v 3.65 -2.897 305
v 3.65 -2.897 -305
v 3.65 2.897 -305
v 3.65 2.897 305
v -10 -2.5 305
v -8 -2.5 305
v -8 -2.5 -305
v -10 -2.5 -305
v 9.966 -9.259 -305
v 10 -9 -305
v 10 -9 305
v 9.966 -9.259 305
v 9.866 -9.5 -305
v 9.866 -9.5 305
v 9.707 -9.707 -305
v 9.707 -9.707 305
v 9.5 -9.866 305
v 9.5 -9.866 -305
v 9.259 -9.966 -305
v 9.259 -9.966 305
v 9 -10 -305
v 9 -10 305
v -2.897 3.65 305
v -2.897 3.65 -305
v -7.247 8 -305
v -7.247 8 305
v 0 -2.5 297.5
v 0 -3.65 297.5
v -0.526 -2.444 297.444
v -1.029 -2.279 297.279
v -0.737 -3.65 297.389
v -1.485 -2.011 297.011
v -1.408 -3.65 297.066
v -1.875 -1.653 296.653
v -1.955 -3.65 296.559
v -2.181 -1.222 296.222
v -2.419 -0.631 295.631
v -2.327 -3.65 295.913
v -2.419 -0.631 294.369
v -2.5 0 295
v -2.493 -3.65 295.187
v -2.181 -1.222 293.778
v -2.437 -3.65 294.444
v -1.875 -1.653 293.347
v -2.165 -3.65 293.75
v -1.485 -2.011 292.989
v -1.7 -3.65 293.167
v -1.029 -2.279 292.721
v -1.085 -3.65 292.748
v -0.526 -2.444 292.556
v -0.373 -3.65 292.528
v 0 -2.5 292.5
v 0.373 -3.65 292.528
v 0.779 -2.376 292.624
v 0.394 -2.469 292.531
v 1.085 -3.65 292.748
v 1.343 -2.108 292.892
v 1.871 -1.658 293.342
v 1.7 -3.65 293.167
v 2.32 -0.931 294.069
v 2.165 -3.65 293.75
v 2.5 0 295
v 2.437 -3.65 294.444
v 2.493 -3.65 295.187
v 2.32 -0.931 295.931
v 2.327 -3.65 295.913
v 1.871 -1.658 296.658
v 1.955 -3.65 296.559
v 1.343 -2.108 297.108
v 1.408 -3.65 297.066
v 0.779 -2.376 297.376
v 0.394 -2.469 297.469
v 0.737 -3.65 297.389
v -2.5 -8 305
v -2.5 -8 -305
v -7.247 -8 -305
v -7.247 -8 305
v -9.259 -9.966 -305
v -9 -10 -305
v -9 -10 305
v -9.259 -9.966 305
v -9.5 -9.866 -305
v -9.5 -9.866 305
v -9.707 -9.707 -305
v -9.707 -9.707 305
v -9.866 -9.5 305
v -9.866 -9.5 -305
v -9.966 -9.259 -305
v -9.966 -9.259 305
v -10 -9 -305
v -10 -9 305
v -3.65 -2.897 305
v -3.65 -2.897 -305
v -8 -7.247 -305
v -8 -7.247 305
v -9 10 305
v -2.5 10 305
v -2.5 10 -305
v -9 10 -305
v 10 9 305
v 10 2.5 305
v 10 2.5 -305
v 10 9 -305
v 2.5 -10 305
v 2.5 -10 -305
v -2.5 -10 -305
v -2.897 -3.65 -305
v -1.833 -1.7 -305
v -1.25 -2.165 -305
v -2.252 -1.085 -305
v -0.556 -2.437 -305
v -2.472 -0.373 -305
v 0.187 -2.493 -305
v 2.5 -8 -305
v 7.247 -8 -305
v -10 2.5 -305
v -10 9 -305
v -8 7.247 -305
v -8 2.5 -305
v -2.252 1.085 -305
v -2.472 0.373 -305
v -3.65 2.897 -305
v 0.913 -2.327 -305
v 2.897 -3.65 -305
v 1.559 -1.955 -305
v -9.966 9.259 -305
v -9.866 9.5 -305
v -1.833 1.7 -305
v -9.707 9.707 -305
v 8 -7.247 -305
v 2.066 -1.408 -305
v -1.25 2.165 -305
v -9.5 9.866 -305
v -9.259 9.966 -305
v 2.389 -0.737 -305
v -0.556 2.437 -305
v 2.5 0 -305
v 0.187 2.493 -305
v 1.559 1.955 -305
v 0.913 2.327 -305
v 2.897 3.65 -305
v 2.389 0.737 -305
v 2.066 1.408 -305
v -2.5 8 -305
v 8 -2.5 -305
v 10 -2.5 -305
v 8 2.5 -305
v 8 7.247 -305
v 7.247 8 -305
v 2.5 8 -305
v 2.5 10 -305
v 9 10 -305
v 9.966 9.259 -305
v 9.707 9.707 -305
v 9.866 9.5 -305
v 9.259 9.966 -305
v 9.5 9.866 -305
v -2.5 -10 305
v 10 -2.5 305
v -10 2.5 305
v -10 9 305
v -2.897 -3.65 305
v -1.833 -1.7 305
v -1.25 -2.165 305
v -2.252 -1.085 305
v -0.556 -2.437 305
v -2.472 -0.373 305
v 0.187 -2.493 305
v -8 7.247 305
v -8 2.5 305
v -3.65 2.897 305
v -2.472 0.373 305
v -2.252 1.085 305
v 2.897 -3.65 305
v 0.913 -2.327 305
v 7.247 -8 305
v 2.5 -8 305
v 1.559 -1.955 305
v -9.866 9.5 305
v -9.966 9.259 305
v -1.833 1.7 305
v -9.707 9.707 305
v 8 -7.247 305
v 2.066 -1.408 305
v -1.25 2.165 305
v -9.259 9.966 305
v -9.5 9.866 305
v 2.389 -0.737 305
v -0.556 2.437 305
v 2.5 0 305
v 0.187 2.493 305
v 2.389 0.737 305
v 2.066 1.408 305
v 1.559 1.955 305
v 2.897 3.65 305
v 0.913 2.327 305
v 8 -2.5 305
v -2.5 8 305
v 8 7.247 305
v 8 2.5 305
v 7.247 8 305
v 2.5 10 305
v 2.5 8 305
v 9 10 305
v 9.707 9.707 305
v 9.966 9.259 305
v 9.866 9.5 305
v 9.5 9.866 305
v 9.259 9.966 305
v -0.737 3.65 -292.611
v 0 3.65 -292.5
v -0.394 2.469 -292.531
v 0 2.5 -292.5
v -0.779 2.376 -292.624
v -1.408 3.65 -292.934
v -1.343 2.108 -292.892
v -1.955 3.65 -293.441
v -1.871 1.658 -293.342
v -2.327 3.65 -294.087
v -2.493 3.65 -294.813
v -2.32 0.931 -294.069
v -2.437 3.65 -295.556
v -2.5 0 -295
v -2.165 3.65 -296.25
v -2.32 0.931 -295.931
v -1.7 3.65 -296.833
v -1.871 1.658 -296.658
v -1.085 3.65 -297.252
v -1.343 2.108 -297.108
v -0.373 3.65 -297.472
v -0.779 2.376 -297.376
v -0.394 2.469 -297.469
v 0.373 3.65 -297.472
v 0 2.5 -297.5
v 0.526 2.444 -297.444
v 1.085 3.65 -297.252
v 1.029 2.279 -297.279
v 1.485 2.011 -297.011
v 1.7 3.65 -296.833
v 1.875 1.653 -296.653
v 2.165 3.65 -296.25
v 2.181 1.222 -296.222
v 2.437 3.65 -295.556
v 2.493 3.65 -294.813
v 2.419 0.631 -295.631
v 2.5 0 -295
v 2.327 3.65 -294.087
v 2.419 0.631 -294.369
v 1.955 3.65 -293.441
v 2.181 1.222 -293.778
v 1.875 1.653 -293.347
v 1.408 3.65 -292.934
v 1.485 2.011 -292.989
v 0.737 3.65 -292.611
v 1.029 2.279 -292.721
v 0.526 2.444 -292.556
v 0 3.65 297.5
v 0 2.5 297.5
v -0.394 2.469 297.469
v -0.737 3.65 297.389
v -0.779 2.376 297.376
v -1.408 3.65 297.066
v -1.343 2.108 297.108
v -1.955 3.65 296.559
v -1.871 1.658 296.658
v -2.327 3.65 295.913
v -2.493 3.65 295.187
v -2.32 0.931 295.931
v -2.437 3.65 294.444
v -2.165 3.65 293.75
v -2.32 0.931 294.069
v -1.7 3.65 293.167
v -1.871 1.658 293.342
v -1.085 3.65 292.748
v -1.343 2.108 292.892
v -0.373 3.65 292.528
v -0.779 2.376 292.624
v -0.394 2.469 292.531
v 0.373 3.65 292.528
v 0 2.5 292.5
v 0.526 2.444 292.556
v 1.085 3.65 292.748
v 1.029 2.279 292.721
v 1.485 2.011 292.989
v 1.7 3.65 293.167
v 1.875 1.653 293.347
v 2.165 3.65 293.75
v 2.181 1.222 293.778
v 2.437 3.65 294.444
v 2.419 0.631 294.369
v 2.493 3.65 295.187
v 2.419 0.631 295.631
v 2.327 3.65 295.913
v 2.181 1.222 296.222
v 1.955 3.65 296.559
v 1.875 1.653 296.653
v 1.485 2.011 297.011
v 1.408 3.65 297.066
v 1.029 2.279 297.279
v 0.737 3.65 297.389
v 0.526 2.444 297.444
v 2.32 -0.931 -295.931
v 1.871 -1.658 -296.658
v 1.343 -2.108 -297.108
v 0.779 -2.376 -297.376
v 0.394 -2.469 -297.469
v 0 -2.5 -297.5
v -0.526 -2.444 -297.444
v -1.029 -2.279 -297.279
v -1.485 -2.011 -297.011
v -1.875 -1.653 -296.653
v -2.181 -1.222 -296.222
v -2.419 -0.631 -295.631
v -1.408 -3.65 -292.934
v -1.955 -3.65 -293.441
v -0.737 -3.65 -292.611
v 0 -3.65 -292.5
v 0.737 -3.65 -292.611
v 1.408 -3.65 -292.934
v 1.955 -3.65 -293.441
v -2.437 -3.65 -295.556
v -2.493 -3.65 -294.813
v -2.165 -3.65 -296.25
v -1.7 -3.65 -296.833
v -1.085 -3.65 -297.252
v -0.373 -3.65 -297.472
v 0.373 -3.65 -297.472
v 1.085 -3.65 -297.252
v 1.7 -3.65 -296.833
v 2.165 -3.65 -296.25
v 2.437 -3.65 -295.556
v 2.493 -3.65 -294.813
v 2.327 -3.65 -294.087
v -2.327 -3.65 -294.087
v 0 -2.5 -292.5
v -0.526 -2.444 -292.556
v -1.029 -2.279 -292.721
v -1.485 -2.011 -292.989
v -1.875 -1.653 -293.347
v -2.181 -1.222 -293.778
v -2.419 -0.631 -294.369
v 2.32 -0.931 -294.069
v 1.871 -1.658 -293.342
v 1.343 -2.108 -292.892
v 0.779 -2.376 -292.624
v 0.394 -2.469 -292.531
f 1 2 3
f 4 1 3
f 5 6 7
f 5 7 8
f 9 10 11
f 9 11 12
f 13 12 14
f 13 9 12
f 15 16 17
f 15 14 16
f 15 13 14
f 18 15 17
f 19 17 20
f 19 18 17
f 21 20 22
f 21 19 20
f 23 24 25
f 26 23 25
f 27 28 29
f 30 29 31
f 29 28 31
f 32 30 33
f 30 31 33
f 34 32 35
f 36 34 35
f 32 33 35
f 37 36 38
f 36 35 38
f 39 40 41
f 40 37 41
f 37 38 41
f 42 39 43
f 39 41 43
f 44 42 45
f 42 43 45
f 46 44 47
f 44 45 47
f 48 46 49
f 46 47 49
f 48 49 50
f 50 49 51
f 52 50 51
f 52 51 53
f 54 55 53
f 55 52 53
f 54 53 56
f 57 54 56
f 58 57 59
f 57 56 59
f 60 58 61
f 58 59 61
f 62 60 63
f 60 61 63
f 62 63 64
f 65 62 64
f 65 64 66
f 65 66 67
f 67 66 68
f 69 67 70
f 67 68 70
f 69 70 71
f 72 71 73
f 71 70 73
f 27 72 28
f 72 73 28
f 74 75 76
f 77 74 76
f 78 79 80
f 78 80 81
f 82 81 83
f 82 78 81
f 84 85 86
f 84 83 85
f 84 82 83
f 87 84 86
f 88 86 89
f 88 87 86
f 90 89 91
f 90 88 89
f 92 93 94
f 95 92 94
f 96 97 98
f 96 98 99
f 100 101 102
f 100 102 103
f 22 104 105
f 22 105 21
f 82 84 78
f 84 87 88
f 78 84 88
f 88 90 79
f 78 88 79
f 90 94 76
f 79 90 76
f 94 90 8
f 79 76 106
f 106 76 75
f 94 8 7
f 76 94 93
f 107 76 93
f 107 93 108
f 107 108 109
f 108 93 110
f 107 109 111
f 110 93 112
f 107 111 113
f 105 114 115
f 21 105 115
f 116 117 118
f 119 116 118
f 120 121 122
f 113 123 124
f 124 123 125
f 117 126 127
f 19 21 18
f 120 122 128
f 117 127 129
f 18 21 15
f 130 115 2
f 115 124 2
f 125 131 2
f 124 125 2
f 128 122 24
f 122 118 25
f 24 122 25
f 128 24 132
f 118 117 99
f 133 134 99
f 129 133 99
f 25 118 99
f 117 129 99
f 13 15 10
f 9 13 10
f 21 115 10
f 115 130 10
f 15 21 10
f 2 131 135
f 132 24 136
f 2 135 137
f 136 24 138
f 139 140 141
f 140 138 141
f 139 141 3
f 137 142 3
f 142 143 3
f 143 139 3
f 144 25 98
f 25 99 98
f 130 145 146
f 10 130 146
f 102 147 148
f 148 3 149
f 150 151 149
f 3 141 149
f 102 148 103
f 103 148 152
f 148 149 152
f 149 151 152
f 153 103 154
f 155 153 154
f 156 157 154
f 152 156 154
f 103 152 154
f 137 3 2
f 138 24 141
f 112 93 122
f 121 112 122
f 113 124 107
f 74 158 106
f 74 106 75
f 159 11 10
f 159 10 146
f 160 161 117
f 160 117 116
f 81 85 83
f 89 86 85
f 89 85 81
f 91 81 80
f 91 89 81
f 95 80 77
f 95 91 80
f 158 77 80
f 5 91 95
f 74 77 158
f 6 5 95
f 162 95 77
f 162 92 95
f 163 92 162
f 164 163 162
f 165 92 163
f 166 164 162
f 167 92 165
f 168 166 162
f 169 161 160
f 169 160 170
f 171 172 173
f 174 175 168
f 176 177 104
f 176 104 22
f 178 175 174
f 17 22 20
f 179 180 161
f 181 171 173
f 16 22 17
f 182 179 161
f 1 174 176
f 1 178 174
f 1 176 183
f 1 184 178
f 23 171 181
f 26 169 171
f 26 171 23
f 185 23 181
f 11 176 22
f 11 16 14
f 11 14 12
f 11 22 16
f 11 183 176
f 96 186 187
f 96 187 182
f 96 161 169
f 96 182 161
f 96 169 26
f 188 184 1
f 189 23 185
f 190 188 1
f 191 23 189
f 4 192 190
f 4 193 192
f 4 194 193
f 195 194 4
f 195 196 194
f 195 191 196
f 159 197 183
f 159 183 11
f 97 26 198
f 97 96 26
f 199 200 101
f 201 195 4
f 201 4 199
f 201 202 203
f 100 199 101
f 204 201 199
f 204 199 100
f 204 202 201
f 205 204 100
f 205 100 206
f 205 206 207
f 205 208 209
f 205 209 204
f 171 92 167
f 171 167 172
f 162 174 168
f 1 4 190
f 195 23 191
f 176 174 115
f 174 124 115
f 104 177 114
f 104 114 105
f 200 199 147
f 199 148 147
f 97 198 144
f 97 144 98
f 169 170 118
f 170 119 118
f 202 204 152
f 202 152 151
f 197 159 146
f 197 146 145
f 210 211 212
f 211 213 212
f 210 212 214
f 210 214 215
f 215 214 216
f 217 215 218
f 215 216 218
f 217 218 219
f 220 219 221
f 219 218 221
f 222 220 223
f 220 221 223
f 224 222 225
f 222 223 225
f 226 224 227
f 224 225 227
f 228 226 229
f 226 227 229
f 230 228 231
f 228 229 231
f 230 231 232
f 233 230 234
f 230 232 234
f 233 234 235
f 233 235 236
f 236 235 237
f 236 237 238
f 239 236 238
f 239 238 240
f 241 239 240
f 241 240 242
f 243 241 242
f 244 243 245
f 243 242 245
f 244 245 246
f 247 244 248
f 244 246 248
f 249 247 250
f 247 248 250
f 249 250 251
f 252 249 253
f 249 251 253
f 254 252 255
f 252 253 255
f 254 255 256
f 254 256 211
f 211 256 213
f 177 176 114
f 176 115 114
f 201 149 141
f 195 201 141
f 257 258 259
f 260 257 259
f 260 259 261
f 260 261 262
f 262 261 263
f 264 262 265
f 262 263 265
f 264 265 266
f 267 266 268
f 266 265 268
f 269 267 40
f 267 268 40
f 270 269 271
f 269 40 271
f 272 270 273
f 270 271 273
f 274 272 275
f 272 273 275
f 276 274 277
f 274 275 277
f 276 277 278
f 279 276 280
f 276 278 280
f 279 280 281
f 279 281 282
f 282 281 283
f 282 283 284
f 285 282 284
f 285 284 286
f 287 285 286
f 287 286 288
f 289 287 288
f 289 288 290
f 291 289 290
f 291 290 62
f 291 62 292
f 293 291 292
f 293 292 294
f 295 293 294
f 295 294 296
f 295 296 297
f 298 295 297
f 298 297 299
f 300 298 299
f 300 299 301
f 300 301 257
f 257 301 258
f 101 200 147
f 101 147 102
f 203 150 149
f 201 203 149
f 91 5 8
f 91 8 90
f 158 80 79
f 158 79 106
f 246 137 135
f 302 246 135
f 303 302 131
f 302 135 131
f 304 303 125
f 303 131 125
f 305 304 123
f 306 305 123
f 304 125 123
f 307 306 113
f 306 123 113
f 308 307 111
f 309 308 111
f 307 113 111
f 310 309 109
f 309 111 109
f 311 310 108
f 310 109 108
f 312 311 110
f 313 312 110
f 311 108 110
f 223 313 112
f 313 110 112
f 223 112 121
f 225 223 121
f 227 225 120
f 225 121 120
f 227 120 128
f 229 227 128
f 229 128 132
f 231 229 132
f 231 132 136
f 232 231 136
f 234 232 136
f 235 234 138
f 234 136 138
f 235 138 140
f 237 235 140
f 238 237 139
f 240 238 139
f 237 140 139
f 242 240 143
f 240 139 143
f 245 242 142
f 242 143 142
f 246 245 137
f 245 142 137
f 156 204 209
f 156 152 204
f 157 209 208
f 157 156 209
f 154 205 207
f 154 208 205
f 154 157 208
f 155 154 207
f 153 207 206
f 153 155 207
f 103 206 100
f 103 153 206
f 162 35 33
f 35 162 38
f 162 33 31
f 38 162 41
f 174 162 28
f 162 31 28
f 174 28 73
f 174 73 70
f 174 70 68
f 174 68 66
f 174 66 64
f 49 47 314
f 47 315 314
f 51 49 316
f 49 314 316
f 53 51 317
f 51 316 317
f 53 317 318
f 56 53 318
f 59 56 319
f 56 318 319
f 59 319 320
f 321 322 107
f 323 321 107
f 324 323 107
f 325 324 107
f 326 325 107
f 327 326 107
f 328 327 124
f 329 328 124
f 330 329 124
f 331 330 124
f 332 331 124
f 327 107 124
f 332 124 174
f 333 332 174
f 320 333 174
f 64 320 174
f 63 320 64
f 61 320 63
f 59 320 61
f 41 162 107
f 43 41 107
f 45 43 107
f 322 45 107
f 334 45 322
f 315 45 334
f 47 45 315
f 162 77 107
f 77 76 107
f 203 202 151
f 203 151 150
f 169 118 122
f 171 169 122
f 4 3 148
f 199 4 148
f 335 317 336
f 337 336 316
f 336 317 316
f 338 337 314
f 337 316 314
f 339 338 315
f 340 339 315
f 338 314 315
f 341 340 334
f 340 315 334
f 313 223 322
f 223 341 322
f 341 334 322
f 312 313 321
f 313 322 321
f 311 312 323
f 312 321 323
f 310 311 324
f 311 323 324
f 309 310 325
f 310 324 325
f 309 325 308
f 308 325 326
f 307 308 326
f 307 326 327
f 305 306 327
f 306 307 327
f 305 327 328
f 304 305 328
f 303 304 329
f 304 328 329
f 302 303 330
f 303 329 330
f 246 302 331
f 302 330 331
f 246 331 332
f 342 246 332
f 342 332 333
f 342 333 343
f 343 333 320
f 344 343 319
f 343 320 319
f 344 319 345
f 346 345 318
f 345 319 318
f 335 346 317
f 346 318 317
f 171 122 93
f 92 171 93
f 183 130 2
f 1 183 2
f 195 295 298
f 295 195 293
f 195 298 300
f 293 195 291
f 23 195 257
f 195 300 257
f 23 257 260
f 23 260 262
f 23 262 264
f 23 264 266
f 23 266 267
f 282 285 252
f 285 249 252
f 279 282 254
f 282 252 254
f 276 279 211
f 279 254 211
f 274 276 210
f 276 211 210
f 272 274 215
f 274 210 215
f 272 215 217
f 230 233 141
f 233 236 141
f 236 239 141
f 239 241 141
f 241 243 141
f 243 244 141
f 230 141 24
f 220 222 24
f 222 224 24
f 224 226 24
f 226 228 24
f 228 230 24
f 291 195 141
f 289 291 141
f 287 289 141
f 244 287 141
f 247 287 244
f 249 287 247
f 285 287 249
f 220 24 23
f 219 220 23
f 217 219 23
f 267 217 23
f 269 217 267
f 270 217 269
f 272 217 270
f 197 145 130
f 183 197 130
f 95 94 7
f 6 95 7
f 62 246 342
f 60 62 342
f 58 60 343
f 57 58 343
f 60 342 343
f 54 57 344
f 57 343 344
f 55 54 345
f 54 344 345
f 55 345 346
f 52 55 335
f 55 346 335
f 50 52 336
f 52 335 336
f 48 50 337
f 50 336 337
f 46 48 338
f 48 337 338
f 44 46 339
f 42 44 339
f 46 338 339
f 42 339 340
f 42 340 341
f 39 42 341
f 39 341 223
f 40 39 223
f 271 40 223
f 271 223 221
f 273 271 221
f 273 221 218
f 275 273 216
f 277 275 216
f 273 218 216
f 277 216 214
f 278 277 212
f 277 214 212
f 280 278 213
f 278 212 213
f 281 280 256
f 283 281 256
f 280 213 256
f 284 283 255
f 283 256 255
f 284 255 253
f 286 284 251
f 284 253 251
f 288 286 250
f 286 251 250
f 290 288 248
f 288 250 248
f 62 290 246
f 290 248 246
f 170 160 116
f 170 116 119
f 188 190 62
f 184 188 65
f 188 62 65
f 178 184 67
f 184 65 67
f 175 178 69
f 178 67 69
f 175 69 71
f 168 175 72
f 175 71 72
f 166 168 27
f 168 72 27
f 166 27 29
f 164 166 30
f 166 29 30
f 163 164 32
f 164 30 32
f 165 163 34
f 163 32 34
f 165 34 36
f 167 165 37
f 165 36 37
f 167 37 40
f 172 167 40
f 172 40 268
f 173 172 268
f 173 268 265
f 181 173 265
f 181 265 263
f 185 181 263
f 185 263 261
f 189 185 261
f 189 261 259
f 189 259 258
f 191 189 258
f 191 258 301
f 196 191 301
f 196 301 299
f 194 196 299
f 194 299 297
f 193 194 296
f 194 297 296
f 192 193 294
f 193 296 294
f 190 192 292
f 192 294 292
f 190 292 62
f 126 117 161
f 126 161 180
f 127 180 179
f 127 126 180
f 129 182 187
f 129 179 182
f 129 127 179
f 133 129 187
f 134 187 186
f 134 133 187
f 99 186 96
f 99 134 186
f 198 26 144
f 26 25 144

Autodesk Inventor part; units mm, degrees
ref_plane "YZ Plane" through (0, 0, 0) normal (1, 0, 0) x (0, 1, 0)
ref_plane "XZ Plane" through (0, 0, 0) normal (0, 1, 0) x (-1, 0, 0)
ref_plane "XY Plane" through (0, 0, 0) normal (0, 0, 1) x (1, 0, 0)
sketch "Sketch1" plane through (0, 0, 0) normal (0, 0, 1) x (1, 0, 0)
  line L0 (9, 10) -> (2.5, 10)
  line L1 (-10, 9) -> (-10, 2.5)
  line L2 (-9, -10) -> (-2.5, -10)
  line L3 (10, -9) -> (10, -2.5)
  circle A0 centre (0, 0) radius 2.5
  line L4 (3.6, 3.6) -> (-3.6, 3.6) construction
  line L5 (-3.6, 3.6) -> (-3.6, -3.6) construction
  line L6 (-3.6, -3.6) -> (3.6, -3.6) construction
  line L7 (3.6, -3.6) -> (3.6, 3.6) construction
  line L8 (3.6, 3.6) -> (10, 10) construction
  line L9 (3.6, -3.6) -> (10, -10) construction
  line L10 (-3.6, -3.6) -> (-10, -10) construction
  line L11 (-10, 10) -> (-3.6, 3.6) construction
  line L12 (3.65, 2.8974) -> (8, 7.2474)
  line L13 (8, 7.2474) -> (8, 2.5)
  line L14 (8, 2.5) -> (10, 2.5)
  line L15 (10, 2.5) -> (10, -2.5) construction
  line L16 (10, -2.5) -> (8, -2.5)
  line L17 (8, -2.5) -> (8, -7.2474)
  line L18 (8, -7.2474) -> (3.65, -2.8974)
  line L19 (3.65, -2.8974) -> (3.65, 2.8974)
  line L20 (10, 2.5) -> (10, 9)
  line L21 (10, -2.5) -> (10, 2.5) construction
  line L22 (-2.5, 8) -> (-2.5, 10)
  line L23 (-7.2474, 8) -> (-2.5, 8)
  line L24 (-2.8974, 3.65) -> (-7.2474, 8)
  line L25 (2.8974, 3.65) -> (-2.8974, 3.65)
  line L26 (7.2474, 8) -> (2.8974, 3.65)
  line L27 (2.5, 8) -> (7.2474, 8)
  line L28 (2.5, 10) -> (2.5, 8)
  line L29 (-8, -2.5) -> (-10, -2.5)
  line L30 (-8, -7.2474) -> (-8, -2.5)
  line L31 (-3.65, -2.8974) -> (-8, -7.2474)
  line L32 (-3.65, 2.8974) -> (-3.65, -2.8974)
  line L33 (-8, 7.2474) -> (-3.65, 2.8974)
  line L34 (-8, 2.5) -> (-8, 7.2474)
  line L35 (-10, 2.5) -> (-8, 2.5)
  line L36 (2.5, -8) -> (2.5, -10)
  line L37 (7.2474, -8) -> (2.5, -8)
  line L38 (2.8974, -3.65) -> (7.2474, -8)
  line L39 (-2.8974, -3.65) -> (2.8974, -3.65)
  line L40 (-7.2474, -8) -> (-2.8974, -3.65)
  line L41 (-2.5, -8) -> (-7.2474, -8)
  line L42 (-2.5, -10) -> (-2.5, -8)
  line L43 (-2.5, -10) -> (2.5, -10) construction
  line L44 (2.5, -10) -> (9, -10)
  line L45 (-10, 2.5) -> (-10, -2.5) construction
  line L46 (-10, -2.5) -> (-10, -9)
  line L47 (-2.5, 10) -> (-9, 10)
  line L48 (2.5, 10) -> (-2.5, 10) construction
  arc A1 (-9, 10) -> (-10, 9) centre (-9, 9) ccw
  arc A2 (10, 9) -> (9, 10) centre (9, 9) ccw
  arc A3 (9, -10) -> (10, -9) centre (9, -9) ccw
  arc A4 (-10, -9) -> (-9, -10) centre (-9, -9) ccw
  point P0 (0, 0)
  point P1 (0, 3.6)
  point P2 (3.6, 0)
  point P3 (10, 0)
  point P4 (3.65, 0)
  point P5 (10, 0)
  point P6 (0, 3.65)
  point P7 (0, 3.65)
  point P8 (-3.65, 0)
  point P9 (0, -3.65)
  point P10 (0, 10)
  dimension "d2" = 5
  dimension "d3" = 7.2
  dimension "d4" = 7.2
  dimension "d5" = 2
  dimension "d6" = 6.35
  dimension "d7" = 4.7474
  dimension "d8" = 5
  dimension "d9" = 10
  dimension "d10" = 360
  dimension "d11" = 10
  dimension "d12" = 1
extrude "Perfil 20X20-620" add sketch "Sketch1" along normal mid plane 610
thread "M6-1" size "M6x1" class "6H" standard "ANSI Metric M Profile" length 25
thread "M6-2" size "M6x1" class "6H" standard "ANSI Metric M Profile" length 25
sketch "Sketch2" plane through (-2.8974, 10, 305) normal (0, 1, 0) x (1, 0, 0)
  line L0 (2.8974, 10) -> (2.8974, 600) construction
  point P0 (2.8974, 305)
  point P1 (2.8974, 305)
  dimension "d23" = 590
hole "BCA M5" [suppressed]
sketch "Sketch3" plane through (-2.8974, 3.65, 305) normal (0, 1, 0) x (1, 0, 0)
  line L0 (2.8974, 10) -> (2.8974, 600) construction
  point P0 (2.8974, 305)
  point P1 (2.8974, 305)
  dimension "d31" = 590
hole "M5" [suppressed]
sketch "Sketch4" plane through (-2.8974, 3.65, 305) normal (0, 1, 0) x (1, 0, 0)
  line L0 (2.8974, 10) -> (2.8974, 600) construction
  point P0 (2.8974, 305)
  point P1 (2.8974, 305)
  dimension "d39" = 590
hole "Ø5" at (0, 3.65, 295) at (0, 3.65, -295) direction (0, -1, 0) diameter 5 end through all
thread "Thread3" size "M6x1" class "6H" standard "ANSI Metric M Profile" length 15
properties part number "Perfil 20X20 T-622"
